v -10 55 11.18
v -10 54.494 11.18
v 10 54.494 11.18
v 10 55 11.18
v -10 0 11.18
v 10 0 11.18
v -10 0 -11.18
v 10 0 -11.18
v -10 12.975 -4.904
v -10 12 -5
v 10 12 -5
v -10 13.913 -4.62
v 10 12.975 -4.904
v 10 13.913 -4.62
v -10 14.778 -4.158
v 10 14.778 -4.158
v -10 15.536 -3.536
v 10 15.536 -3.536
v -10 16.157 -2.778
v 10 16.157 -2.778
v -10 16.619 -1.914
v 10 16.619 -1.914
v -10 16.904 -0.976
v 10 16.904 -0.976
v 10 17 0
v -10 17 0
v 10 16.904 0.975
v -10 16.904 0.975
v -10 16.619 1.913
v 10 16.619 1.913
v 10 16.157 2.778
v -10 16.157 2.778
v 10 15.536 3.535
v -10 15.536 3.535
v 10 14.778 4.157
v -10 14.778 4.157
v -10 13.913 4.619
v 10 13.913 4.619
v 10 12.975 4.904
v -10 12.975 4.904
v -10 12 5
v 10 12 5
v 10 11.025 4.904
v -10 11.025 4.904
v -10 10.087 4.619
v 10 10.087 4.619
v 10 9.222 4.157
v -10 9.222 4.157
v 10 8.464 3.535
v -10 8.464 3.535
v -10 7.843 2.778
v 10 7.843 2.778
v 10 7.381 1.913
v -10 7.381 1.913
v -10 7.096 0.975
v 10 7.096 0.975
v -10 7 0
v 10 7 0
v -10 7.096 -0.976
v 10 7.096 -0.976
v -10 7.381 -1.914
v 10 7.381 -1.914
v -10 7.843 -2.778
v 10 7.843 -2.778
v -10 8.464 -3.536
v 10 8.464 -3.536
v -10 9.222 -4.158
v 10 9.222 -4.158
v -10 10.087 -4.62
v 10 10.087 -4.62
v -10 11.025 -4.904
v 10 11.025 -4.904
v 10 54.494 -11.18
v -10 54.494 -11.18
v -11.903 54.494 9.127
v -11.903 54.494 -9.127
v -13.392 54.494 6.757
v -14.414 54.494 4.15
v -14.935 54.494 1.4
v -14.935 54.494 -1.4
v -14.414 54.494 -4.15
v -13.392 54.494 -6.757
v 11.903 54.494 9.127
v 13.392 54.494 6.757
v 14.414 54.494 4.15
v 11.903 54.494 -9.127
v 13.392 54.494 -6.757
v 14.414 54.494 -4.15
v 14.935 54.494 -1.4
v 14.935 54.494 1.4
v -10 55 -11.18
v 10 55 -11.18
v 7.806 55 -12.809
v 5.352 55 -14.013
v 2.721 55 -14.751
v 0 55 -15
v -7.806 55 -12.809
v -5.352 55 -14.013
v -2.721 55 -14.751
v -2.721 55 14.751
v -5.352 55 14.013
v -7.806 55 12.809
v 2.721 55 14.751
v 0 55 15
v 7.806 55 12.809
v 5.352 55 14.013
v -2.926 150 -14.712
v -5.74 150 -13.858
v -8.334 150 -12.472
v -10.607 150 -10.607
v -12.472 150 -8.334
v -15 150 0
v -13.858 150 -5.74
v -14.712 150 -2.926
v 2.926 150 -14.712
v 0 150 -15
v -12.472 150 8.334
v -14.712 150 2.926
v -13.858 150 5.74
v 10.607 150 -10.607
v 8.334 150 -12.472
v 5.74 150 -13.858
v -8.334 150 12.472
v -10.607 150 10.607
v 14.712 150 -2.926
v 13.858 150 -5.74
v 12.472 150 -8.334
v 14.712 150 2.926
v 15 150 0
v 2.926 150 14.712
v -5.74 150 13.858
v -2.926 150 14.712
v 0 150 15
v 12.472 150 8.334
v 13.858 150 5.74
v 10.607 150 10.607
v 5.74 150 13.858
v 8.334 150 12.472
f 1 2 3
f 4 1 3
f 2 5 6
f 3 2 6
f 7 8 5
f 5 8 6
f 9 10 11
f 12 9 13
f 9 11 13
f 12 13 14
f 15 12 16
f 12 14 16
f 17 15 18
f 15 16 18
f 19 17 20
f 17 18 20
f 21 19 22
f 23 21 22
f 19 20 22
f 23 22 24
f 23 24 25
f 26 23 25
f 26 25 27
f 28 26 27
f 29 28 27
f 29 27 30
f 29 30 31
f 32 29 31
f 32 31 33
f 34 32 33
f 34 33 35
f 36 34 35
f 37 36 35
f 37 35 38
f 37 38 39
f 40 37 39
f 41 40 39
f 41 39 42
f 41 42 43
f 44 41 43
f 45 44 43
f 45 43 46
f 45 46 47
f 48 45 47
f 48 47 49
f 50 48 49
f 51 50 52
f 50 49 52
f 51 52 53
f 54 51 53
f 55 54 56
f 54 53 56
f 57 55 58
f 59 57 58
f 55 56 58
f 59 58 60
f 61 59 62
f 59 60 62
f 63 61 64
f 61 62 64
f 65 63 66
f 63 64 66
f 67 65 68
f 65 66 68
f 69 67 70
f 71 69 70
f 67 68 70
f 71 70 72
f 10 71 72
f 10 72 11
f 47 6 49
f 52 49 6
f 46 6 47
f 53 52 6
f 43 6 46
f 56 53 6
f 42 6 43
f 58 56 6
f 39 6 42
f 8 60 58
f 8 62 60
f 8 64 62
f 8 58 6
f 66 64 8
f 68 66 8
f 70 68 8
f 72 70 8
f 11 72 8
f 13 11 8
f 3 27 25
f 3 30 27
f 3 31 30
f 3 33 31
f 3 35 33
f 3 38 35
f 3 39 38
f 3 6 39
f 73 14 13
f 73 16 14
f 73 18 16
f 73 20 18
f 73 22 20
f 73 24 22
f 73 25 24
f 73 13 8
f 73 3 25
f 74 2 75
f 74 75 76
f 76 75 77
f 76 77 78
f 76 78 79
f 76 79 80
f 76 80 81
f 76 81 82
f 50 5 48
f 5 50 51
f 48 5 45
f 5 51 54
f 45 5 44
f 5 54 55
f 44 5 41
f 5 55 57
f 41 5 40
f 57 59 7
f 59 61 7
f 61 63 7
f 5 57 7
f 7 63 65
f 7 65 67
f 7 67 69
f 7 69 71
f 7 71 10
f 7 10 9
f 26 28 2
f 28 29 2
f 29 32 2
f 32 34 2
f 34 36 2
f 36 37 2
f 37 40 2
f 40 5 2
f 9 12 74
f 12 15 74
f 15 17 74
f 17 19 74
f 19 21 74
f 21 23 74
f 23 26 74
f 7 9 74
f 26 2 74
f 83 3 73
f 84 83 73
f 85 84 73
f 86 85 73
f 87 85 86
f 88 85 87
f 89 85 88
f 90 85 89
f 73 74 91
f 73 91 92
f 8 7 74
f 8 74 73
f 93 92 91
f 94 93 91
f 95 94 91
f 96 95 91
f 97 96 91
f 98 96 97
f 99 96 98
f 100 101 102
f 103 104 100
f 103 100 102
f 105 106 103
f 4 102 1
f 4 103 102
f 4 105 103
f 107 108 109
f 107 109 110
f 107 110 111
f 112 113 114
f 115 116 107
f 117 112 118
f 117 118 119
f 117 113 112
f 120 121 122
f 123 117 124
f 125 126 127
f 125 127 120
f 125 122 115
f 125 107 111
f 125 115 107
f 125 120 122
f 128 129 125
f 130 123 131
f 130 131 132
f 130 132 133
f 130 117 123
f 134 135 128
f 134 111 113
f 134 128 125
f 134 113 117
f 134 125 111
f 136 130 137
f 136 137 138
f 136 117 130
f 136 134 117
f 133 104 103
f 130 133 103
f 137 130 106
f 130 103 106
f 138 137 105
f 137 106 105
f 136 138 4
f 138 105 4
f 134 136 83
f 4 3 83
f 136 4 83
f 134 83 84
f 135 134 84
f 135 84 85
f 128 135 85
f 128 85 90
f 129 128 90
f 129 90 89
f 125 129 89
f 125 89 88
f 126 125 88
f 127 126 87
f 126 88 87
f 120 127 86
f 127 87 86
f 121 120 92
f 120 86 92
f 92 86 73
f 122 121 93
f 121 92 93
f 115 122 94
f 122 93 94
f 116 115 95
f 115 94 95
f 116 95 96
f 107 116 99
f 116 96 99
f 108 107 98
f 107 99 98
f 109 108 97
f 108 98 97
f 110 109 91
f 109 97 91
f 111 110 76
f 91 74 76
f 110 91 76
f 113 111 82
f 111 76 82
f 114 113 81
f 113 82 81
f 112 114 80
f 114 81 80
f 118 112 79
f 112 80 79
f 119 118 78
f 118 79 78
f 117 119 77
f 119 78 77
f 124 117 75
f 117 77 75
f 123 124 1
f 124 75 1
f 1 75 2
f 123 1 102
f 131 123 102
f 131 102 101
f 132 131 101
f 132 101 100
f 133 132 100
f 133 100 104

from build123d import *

# Parameters (mm, degrees)
SKETCH2_R           = 15
BOSS_EXTRUDE1_DEPTH = 150
CUT_EXTRUDE1_START  = 10
SKETCH3_W           = 30
SKETCH3_H           = 108.98871412
CUT_EXTRUDE1_DEPTH  = 100
CUT_EXTRUDE2_START  = -10
SKETCH3_2_W         = 30
SKETCH3_2_H         = 108.98871412
CUT_EXTRUDE2_DEPTH  = 100
SKETCH4_R           = 5
CUT_EXTRUDE3_DEPTH  = 100
CUT_EXTRUDE4_DEPTH  = 55


with BuildPart() as part:
    # Sketch2 → Boss-Extrude1 (new body)
    with BuildSketch(Plane(origin=(0, 0, 0), x_dir=(1, 0, 0), z_dir=(0, 1, 0))):
        Circle(SKETCH2_R)
    extrude(amount=BOSS_EXTRUDE1_DEPTH)

    # Sketch3 → Cut-Extrude1 (cut)
    with BuildSketch(Plane(origin=(0, 0, 0), x_dir=(0, 0, -1), z_dir=(1, 0, 0)).offset(CUT_EXTRUDE1_START)):
        Rectangle(SKETCH3_W, SKETCH3_H)
    extrude(amount=CUT_EXTRUDE1_DEPTH, mode=Mode.SUBTRACT)

    # Sketch3<2> → Cut-Extrude2 (cut)
    with BuildSketch(Plane(origin=(0, 0, 0), x_dir=(0, 0, -1), z_dir=(1, 0, 0)).offset(CUT_EXTRUDE2_START)):
        Rectangle(SKETCH3_2_W, SKETCH3_2_H)
    extrude(amount=-CUT_EXTRUDE2_DEPTH, mode=Mode.SUBTRACT)

    # Sketch4 → Cut-Extrude3 (cut)
    with BuildSketch(Plane(origin=(10, 0, 0), x_dir=(0, 0, -1), z_dir=(1, 0, 0))):
        with Locations((0.000339887, 12)):
            Circle(SKETCH4_R)
    extrude(amount=-CUT_EXTRUDE3_DEPTH, mode=Mode.SUBTRACT)

    # Sketch5 → Cut-Extrude4 (cut)
    with BuildSketch(Plane.XZ):
        with BuildLine():
            Line((-10, 11.180339887), (10, 11.180339887))
            ThreePointArc((10, 11.180339887), (0, 15), (-10, 11.180339887))
        make_face()
        with BuildLine():
            Line((-10, -11.180339887), (10, -11.180339887))
            ThreePointArc((10, -11.180339887), (0, -15), (-10, -11.180339887))
        make_face()
    extrude(amount=-CUT_EXTRUDE4_DEPTH, mode=Mode.SUBTRACT)


solid = part.part
